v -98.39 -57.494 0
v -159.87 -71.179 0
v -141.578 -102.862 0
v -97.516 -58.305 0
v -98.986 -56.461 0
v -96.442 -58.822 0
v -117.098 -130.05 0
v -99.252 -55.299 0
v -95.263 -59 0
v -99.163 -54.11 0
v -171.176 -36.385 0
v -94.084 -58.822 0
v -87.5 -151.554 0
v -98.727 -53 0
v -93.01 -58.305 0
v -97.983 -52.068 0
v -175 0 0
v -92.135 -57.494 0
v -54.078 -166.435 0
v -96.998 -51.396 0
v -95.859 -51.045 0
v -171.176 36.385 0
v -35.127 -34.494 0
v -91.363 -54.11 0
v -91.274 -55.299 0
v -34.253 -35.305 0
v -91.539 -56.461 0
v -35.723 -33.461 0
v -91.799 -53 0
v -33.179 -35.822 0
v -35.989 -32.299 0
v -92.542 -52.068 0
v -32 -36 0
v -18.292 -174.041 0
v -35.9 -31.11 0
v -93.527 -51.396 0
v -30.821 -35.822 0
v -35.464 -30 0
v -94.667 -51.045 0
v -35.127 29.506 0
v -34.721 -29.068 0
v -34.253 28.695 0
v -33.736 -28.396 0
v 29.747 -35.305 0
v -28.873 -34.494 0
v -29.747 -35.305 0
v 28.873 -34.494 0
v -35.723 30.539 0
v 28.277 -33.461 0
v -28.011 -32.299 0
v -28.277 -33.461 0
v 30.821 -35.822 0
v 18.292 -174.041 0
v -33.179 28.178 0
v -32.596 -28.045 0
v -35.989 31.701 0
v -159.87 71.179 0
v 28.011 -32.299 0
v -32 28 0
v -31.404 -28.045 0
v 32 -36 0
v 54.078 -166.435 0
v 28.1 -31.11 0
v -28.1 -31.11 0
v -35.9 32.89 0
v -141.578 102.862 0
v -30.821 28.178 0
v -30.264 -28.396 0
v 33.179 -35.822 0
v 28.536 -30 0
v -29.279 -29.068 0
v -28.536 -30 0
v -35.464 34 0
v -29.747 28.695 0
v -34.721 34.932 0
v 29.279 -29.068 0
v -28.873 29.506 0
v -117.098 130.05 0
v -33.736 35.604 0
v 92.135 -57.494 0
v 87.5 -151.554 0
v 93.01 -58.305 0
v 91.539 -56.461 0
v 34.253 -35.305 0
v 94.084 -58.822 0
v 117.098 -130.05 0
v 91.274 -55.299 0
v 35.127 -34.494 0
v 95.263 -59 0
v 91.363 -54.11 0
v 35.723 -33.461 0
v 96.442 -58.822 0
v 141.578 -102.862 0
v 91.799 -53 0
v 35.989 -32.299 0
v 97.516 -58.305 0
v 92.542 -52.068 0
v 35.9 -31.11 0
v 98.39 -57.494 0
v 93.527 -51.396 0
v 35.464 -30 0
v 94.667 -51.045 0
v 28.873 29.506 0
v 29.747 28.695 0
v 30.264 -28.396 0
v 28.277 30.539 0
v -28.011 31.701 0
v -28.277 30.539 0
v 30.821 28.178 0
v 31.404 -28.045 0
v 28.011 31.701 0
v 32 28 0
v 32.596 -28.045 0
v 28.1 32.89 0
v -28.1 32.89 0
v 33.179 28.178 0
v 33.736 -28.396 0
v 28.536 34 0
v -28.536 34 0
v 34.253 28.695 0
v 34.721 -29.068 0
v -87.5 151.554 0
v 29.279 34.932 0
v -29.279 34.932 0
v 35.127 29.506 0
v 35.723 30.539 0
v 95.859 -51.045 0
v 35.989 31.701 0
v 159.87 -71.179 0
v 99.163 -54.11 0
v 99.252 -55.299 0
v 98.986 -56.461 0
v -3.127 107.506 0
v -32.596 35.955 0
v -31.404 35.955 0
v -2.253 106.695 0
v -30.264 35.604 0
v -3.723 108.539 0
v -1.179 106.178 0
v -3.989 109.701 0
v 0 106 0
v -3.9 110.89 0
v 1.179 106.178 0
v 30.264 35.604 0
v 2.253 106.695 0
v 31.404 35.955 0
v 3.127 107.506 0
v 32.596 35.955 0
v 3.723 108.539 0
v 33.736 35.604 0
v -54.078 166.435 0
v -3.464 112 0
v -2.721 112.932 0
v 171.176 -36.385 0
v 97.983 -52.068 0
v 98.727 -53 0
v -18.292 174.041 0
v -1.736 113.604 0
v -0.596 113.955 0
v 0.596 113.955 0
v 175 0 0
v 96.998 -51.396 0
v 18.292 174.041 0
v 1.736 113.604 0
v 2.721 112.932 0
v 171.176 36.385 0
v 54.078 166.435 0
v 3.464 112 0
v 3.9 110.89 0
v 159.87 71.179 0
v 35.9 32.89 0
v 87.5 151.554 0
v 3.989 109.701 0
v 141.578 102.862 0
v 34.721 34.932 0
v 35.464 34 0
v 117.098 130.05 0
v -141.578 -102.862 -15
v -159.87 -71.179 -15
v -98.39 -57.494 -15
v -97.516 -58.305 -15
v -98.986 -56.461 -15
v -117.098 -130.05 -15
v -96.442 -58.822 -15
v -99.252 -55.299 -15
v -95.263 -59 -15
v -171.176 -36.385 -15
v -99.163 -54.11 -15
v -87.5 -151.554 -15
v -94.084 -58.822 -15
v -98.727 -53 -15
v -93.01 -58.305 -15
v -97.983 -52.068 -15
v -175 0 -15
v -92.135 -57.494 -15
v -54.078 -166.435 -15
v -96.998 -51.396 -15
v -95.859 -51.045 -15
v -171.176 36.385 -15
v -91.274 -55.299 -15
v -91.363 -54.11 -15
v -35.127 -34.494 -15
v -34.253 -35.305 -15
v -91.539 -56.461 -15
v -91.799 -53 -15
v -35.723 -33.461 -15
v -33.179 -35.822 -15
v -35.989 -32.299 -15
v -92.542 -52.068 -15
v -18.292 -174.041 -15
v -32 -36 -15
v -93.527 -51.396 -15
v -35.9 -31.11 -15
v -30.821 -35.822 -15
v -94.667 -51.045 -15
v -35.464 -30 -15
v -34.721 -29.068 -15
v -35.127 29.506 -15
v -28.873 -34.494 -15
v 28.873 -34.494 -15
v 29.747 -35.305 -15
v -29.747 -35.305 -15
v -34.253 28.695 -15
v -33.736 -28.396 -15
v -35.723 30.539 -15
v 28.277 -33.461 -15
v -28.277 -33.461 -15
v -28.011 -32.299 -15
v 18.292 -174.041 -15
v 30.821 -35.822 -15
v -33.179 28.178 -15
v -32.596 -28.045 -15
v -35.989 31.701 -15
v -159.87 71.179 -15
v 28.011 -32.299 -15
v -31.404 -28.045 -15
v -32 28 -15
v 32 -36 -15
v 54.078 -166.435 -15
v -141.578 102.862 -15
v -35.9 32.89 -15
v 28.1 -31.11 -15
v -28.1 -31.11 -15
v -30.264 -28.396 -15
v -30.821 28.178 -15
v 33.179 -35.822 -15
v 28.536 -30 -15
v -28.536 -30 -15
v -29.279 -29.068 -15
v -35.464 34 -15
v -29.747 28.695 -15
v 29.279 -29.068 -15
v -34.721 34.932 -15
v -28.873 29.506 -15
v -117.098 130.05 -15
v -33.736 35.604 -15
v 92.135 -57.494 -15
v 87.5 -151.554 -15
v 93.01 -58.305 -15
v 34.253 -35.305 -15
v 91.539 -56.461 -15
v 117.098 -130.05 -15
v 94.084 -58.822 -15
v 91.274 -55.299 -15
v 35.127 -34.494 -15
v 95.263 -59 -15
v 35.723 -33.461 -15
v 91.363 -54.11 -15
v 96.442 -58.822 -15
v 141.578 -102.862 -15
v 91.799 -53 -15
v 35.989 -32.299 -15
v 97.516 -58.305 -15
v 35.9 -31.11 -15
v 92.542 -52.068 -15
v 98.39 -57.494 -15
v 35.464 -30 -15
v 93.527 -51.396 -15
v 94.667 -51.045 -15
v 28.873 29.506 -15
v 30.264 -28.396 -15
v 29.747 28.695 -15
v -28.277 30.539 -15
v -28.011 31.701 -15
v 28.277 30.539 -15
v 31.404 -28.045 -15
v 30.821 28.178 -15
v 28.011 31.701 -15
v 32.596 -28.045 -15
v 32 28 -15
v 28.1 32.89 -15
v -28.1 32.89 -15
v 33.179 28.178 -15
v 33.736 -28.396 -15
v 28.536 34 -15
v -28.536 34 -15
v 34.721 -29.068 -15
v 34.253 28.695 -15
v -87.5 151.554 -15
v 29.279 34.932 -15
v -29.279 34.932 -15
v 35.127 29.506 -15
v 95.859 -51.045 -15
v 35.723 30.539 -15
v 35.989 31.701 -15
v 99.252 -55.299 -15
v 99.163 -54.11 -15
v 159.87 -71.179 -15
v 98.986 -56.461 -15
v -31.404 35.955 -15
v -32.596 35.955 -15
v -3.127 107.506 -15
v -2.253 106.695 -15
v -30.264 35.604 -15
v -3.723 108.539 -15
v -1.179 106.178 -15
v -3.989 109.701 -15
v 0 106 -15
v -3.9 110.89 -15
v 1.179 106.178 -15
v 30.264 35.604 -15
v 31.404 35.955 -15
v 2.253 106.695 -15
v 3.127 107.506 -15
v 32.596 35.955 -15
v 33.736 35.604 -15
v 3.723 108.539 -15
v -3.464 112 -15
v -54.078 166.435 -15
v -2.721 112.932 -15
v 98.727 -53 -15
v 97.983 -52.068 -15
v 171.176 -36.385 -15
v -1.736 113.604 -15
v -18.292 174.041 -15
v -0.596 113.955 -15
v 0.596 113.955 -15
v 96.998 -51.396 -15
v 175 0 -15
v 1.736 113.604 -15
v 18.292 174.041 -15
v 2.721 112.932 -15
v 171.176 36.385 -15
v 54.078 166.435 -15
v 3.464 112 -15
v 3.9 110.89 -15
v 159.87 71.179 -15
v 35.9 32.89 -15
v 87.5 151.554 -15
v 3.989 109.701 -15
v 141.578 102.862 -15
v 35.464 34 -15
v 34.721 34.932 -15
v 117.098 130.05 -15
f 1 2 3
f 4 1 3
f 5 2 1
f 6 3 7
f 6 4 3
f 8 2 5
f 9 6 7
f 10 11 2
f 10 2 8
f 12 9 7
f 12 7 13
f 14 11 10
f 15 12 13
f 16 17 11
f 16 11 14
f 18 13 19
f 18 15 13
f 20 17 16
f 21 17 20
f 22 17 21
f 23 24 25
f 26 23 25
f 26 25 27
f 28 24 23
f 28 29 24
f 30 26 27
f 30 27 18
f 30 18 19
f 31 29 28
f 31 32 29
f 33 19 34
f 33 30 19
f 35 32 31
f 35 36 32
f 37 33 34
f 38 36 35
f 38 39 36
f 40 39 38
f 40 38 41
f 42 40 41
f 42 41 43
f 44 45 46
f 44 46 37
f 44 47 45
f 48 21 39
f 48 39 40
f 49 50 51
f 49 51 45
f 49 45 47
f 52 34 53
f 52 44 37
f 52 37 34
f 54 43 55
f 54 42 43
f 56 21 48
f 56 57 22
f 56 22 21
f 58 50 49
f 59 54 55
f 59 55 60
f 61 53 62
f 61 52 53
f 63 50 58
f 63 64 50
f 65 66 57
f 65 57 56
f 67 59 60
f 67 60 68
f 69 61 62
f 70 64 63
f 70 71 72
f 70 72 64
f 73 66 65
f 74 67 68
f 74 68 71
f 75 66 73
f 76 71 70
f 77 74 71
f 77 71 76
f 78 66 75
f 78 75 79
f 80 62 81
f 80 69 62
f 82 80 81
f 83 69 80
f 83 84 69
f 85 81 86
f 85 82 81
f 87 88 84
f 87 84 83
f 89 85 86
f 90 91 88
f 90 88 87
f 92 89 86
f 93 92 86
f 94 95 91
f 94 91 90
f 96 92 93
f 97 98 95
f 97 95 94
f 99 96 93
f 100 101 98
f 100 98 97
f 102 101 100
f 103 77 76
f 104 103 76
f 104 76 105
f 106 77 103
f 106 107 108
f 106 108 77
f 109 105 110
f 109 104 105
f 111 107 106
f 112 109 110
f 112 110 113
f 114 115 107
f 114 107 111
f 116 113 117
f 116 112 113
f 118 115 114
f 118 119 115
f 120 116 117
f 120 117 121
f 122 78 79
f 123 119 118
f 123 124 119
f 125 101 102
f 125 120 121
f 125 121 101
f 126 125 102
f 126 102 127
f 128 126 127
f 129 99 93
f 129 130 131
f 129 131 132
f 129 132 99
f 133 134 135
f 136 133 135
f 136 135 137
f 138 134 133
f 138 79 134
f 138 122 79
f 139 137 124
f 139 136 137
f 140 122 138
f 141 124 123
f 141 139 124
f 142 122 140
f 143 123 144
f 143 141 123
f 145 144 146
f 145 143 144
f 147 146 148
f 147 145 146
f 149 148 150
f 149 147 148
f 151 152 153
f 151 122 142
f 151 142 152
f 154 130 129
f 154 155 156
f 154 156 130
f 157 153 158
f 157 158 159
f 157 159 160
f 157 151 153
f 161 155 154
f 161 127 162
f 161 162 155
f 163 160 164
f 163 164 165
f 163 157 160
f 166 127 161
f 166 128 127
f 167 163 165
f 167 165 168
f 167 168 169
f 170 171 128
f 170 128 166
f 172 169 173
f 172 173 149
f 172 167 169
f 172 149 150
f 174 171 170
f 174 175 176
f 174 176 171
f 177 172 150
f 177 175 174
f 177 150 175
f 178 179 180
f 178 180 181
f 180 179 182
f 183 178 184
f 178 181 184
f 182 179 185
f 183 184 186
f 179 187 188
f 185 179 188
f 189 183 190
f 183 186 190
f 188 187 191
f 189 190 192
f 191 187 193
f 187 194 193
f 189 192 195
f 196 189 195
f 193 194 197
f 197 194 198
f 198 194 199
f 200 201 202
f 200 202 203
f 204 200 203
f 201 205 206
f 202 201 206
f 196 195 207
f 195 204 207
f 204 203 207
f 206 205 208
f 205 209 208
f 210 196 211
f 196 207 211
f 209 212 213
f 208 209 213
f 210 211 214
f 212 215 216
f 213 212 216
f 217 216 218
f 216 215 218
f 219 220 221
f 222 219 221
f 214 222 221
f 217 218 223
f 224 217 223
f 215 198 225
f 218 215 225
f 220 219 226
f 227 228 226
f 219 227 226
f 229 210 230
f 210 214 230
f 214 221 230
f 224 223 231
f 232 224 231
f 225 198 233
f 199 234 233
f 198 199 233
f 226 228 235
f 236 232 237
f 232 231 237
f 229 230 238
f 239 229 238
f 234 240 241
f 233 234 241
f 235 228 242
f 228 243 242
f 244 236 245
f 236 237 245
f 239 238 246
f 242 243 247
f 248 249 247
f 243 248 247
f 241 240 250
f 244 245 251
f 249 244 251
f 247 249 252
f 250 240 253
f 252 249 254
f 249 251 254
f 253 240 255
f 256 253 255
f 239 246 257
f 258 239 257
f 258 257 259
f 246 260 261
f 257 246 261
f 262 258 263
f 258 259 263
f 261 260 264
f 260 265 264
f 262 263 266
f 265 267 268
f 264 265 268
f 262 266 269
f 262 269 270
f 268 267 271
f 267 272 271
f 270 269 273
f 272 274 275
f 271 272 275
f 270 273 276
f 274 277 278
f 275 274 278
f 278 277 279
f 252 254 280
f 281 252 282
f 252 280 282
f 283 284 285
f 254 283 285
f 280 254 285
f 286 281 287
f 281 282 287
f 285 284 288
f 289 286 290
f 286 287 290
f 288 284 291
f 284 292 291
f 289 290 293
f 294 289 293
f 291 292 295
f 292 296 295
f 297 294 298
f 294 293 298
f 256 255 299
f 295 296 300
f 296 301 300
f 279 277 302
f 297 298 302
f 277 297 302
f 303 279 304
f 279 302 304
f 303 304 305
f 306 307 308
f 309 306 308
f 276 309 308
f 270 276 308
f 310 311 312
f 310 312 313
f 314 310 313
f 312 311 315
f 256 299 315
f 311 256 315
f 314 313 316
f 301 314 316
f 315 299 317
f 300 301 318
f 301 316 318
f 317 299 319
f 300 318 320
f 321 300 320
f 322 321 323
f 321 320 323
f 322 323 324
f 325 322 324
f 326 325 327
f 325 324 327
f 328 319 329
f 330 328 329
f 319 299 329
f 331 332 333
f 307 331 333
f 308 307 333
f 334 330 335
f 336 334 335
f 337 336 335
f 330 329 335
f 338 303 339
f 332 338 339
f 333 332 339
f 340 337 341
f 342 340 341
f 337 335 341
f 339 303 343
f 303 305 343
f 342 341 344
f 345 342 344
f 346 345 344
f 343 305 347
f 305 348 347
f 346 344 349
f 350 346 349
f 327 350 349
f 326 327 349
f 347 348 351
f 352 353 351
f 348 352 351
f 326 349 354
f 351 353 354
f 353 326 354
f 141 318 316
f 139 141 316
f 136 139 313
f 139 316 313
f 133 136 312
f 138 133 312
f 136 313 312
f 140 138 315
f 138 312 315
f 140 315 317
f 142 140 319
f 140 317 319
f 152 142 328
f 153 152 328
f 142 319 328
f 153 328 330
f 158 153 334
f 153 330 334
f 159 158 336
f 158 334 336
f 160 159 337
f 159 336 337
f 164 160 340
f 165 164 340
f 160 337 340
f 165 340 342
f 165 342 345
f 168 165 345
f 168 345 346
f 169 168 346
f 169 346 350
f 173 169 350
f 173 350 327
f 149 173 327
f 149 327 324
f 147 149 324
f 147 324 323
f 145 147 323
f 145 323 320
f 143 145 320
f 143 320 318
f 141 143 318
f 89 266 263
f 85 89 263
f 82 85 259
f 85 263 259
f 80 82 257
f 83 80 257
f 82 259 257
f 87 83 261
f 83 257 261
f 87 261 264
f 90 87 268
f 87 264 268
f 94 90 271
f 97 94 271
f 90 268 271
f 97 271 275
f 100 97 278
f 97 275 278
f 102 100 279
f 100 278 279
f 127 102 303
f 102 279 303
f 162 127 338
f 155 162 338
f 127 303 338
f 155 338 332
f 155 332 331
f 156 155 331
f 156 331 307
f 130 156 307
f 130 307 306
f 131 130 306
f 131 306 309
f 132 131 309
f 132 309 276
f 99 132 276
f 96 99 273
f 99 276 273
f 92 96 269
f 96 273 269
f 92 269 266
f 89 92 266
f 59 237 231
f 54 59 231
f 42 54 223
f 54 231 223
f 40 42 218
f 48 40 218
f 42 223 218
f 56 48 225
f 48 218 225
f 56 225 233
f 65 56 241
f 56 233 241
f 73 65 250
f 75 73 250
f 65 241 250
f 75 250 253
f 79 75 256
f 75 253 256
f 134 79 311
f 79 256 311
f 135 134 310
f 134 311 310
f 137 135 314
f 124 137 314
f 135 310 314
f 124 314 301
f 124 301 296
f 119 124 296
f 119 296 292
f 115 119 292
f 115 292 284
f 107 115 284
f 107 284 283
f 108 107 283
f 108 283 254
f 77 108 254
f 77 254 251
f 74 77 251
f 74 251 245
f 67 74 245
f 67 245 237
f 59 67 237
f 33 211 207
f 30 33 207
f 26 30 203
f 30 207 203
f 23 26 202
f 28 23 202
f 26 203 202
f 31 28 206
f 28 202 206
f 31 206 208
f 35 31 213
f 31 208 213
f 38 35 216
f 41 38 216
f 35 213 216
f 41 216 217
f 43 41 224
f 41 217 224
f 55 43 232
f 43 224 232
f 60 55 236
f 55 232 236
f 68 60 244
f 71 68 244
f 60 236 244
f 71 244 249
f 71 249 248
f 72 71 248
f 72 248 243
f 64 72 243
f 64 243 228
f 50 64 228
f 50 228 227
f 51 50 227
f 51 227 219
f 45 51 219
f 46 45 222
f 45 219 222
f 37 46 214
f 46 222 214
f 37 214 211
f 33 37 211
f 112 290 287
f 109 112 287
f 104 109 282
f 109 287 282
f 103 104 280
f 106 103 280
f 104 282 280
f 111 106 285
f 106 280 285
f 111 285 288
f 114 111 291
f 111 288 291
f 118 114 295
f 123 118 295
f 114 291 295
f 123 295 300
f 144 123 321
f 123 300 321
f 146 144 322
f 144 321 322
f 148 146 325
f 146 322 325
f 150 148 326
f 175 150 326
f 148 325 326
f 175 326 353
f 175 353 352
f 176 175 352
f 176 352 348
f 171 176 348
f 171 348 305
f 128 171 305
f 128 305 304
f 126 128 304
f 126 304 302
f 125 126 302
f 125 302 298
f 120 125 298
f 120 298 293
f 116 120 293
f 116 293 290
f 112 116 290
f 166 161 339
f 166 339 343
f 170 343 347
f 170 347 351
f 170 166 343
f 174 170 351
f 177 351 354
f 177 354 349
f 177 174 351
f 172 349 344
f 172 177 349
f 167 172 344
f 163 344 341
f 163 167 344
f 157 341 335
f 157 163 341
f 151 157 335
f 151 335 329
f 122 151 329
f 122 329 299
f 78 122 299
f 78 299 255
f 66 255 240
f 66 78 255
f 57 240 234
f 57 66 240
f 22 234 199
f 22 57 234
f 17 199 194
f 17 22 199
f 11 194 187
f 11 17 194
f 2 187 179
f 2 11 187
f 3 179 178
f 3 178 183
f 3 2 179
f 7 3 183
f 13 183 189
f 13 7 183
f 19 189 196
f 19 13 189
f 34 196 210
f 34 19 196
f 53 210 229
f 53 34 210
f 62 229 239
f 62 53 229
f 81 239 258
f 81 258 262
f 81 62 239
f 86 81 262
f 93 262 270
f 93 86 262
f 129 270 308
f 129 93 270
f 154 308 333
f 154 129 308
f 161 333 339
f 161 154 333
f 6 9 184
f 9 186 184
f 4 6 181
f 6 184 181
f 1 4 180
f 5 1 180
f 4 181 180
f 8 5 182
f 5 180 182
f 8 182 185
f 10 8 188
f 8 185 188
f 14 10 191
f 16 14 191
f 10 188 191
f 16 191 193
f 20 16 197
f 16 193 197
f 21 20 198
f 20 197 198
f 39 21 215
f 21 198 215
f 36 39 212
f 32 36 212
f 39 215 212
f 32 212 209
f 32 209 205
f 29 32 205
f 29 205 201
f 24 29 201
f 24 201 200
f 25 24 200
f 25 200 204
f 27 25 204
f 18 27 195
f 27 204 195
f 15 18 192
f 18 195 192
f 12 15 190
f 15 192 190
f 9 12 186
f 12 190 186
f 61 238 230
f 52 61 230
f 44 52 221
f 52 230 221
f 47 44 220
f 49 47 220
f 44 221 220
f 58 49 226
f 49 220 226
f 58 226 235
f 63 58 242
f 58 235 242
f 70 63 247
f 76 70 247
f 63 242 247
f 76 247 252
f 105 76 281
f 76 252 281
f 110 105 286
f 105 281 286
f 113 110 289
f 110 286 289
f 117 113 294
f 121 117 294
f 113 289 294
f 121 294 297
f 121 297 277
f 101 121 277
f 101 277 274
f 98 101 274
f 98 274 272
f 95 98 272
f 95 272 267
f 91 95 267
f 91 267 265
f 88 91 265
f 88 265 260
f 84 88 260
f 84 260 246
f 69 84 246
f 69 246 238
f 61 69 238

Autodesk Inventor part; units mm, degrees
ref_plane "YZ Plane" through (0, 0, 0) normal (1, 0, 0) x (0, 1, 0)
ref_plane "XZ Plane" through (0, 0, 0) normal (0, 1, 0) x (-1, 0, 0)
ref_plane "XY Plane" through (0, 0, 0) normal (0, 0, 1) x (1, 0, 0)
sketch "Skizze1" plane through (0, 0, 0) normal (0, 0, 1) x (1, 0, 0)
  circle A0 centre (0, 0) radius 175
  dimension "d0" = 350
extrude "Extrusion1" add sketch "Skizze1" against normal blind 15
sketch "Skizze2" plane through (0, 0, 0) normal (0, 0, 1) x (1, 0, 0)
  line L0 (-32, 32) -> (32, 32)
  line L1 (32, 32) -> (32, -32)
  line L2 (32, -32) -> (-32, -32)
  line L3 (-32, -32) -> (-32, 32)
  line L4 (-32, 32) -> (32, -32) construction
  line L5 (32, 32) -> (-32, -32) construction
  circle A0 centre (0, 0) radius 110
  line L6 (0, -245) -> (0, 245) projected
  point P0 (0, 110)
  point P1 (-95.2628, -55)
  point P2 (95.2628, -55)
  dimension "d3" = 64
  dimension "d4" = 64
  dimension "d5" = 220
hole "Bohrung1" at (32, 32, 0) at (-32, 32, 0) at (-32, -32, 0) at (32, -32, 0) at (0, 110, 0) at (-95.2628, -55, 0) at (95.2628, -55, 0) direction (0, 0, -1) diameter 8 end through all
properties part number "Verbindungsplatte_Staender"
